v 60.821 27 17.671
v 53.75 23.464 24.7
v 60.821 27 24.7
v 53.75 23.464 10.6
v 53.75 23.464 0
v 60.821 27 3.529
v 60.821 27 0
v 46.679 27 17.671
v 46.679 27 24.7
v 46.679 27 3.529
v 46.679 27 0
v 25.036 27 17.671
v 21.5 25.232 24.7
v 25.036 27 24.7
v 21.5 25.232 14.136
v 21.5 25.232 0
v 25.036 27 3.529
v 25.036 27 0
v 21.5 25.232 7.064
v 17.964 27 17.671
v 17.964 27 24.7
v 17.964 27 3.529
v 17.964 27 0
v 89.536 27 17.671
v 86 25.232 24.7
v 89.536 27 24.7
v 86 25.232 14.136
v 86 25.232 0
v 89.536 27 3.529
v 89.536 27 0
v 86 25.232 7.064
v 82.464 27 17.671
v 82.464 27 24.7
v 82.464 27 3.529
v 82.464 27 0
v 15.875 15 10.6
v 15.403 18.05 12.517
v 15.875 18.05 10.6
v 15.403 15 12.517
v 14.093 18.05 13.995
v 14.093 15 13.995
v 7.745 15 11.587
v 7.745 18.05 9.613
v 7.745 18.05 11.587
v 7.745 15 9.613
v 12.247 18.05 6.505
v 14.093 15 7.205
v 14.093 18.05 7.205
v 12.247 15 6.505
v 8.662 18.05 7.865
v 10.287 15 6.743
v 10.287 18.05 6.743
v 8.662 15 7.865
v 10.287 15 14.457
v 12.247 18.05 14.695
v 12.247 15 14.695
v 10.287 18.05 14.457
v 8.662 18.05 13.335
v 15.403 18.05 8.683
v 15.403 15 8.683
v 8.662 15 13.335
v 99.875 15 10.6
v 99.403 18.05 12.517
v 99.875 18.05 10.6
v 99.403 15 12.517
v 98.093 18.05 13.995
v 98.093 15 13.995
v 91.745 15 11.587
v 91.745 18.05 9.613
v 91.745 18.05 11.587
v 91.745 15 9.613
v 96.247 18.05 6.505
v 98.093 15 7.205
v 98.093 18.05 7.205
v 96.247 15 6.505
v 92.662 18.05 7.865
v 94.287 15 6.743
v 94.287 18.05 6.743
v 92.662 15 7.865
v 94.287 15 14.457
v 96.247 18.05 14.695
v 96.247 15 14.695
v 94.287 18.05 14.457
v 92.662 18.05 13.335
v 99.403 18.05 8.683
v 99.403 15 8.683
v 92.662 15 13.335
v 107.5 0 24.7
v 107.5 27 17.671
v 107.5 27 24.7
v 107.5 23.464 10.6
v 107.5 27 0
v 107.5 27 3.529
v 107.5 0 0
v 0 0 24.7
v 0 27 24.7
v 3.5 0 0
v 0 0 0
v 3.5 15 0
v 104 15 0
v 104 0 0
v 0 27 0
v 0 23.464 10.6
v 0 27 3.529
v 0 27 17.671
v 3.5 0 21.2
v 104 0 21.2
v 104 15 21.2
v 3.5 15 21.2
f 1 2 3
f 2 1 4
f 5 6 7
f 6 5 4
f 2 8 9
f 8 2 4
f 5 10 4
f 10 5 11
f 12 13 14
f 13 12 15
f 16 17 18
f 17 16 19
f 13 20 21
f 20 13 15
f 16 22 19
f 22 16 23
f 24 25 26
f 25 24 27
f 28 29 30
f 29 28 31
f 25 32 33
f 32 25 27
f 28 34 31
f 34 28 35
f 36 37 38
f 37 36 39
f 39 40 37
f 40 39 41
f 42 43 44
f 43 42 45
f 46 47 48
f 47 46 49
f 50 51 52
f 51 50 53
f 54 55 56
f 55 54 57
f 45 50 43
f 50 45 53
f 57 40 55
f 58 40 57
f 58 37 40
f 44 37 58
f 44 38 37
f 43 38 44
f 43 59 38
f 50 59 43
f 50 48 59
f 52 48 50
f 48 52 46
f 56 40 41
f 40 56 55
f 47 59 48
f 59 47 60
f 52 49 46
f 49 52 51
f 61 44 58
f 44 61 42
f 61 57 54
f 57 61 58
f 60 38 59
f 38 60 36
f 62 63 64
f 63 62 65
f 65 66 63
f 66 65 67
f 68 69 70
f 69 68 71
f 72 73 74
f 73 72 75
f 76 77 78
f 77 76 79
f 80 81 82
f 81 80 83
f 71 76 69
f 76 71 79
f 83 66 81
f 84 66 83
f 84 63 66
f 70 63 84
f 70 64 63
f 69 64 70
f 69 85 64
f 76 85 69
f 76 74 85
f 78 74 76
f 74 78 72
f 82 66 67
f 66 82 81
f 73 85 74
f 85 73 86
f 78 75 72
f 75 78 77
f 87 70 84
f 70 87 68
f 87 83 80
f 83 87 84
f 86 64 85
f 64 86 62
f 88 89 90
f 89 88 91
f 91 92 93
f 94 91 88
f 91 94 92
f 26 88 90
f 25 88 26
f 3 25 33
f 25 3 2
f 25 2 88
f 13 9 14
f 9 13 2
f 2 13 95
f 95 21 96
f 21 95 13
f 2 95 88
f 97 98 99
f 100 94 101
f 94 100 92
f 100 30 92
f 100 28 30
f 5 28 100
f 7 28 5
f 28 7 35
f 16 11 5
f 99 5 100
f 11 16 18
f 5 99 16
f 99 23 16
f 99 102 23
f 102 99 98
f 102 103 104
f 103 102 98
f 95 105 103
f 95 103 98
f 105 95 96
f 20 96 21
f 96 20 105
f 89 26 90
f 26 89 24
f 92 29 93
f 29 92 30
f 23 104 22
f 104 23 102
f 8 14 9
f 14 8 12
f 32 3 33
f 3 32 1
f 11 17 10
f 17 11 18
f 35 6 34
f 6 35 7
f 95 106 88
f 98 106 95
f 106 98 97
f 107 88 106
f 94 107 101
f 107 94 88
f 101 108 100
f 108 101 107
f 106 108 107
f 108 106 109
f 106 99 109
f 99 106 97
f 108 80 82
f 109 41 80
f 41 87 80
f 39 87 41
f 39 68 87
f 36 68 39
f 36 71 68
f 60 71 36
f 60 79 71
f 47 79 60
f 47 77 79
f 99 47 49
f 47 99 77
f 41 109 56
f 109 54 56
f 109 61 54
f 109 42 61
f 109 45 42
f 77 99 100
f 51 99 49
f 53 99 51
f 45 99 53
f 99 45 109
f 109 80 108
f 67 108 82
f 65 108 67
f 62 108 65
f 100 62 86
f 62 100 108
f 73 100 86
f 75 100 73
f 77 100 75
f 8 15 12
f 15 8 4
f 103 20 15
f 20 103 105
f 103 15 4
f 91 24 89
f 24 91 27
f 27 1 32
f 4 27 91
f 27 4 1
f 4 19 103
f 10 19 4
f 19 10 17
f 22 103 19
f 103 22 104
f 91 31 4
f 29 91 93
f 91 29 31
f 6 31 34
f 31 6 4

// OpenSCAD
/*[ Jaws ]*/
// Vice jaw width
jawWidth = 100.5;
// Vice jaw height
jawHeight = 21.2;
// Angle one groove?
angledGroove = "no"; // [yes,no]
// Jaw top?
showTop = "yes"; // [yes, no]
// Jaw sides?
showSides = "yes"; // [yes, no]

/*[ Magnets ]*/
magnetDiameter = 8.25;
magnetHeight = 3.05;
numMagnets = 2;

/*[Hidden]*/
magnetRadius = magnetDiameter/2;
jawThickness = 12.0;
jawSideThickness = showSides=="yes" ? 3.5 : 0;
jawTopWidth = 15;
jawTopThickness = showTop=="yes" ? 3.5 : 0;

maxMagnets = min(numMagnets, floor((jawWidth - magnetDiameter)/magnetDiameter));

buffer = 0.2;

function steps( start, no_steps, end) = (no_steps==1) ? [(end-start)/2:1:(end-start)/2] : [start:(end-start)/(no_steps-1):end];

module rotate_about(rotation, pt) {
  translate(pt)
    rotate(rotation)
      translate(-pt)
        children();   
}

difference() {
  cube([jawWidth + jawSideThickness * 2, jawThickness + jawTopWidth, jawHeight + jawTopThickness]);
  
  // jaw pocket
  phBuffer = showSides == "yes" ? 0 : buffer;
  pvBuffer = showTop == "yes" ? 0 : buffer;

  translate([jawSideThickness - phBuffer, -buffer , -buffer]) {
    cube([jawWidth + phBuffer * 2, jawTopWidth + buffer, jawHeight + buffer + pvBuffer]);
  }
    
  // horizontal valley
  translate([-buffer, jawThickness + jawTopWidth, jawHeight/2]) {
    valley(jawWidth + jawSideThickness * 2, 10);
  }
  
  // vertical valleys
  rotate([0, 90, 0]) {
    translate([-(buffer + jawHeight + jawTopThickness), jawThickness + jawTopWidth, (jawWidth + jawSideThickness * 2)/2]) {
      valley(jawHeight + jawTopThickness, 10);
    }
    
    translate([-(buffer + jawHeight + jawTopThickness), jawThickness + jawTopWidth, (jawWidth + jawSideThickness * 2)/5]) {
      valley(jawHeight + jawTopThickness, 5);
    }
    
    translate([-(buffer + jawHeight + jawTopThickness), jawThickness + jawTopWidth, (jawWidth + jawSideThickness * 2)/5 * 4]) {
      if(angledGroove=="yes") {
        translate([-3.3, 0, 3.3 + (jawHeight + jawTopThickness * 2)/2]) {
          rotate([0, 45, 0]) {
            valley((jawHeight + jawTopThickness)*3, 5);
          }
        }
      } else {
        valley(jawHeight + jawTopThickness, 5);
      }
    }
  }

  // magnet holes
  translate([jawSideThickness, jawTopWidth + magnetHeight, jawHeight/2]) {
    for(i=steps(magnetDiameter, maxMagnets, jawWidth - magnetDiameter)) {
      rotate([90, 0, 0]) {
        translate([i, 0, 0]) {
          cylinder(r=magnetRadius, h=magnetHeight + buffer);
        }
      }
    }
  }
}

module valley(width, depth = 10) {
  translate([0, 0, -sqrt(depth*depth + depth*depth)/2]) {
    scale([1, 0.5, 1]) {
      rotate([45, 0, 0]) {
        cube([width + buffer *2, depth, depth]);
      }
    }
  }
}
